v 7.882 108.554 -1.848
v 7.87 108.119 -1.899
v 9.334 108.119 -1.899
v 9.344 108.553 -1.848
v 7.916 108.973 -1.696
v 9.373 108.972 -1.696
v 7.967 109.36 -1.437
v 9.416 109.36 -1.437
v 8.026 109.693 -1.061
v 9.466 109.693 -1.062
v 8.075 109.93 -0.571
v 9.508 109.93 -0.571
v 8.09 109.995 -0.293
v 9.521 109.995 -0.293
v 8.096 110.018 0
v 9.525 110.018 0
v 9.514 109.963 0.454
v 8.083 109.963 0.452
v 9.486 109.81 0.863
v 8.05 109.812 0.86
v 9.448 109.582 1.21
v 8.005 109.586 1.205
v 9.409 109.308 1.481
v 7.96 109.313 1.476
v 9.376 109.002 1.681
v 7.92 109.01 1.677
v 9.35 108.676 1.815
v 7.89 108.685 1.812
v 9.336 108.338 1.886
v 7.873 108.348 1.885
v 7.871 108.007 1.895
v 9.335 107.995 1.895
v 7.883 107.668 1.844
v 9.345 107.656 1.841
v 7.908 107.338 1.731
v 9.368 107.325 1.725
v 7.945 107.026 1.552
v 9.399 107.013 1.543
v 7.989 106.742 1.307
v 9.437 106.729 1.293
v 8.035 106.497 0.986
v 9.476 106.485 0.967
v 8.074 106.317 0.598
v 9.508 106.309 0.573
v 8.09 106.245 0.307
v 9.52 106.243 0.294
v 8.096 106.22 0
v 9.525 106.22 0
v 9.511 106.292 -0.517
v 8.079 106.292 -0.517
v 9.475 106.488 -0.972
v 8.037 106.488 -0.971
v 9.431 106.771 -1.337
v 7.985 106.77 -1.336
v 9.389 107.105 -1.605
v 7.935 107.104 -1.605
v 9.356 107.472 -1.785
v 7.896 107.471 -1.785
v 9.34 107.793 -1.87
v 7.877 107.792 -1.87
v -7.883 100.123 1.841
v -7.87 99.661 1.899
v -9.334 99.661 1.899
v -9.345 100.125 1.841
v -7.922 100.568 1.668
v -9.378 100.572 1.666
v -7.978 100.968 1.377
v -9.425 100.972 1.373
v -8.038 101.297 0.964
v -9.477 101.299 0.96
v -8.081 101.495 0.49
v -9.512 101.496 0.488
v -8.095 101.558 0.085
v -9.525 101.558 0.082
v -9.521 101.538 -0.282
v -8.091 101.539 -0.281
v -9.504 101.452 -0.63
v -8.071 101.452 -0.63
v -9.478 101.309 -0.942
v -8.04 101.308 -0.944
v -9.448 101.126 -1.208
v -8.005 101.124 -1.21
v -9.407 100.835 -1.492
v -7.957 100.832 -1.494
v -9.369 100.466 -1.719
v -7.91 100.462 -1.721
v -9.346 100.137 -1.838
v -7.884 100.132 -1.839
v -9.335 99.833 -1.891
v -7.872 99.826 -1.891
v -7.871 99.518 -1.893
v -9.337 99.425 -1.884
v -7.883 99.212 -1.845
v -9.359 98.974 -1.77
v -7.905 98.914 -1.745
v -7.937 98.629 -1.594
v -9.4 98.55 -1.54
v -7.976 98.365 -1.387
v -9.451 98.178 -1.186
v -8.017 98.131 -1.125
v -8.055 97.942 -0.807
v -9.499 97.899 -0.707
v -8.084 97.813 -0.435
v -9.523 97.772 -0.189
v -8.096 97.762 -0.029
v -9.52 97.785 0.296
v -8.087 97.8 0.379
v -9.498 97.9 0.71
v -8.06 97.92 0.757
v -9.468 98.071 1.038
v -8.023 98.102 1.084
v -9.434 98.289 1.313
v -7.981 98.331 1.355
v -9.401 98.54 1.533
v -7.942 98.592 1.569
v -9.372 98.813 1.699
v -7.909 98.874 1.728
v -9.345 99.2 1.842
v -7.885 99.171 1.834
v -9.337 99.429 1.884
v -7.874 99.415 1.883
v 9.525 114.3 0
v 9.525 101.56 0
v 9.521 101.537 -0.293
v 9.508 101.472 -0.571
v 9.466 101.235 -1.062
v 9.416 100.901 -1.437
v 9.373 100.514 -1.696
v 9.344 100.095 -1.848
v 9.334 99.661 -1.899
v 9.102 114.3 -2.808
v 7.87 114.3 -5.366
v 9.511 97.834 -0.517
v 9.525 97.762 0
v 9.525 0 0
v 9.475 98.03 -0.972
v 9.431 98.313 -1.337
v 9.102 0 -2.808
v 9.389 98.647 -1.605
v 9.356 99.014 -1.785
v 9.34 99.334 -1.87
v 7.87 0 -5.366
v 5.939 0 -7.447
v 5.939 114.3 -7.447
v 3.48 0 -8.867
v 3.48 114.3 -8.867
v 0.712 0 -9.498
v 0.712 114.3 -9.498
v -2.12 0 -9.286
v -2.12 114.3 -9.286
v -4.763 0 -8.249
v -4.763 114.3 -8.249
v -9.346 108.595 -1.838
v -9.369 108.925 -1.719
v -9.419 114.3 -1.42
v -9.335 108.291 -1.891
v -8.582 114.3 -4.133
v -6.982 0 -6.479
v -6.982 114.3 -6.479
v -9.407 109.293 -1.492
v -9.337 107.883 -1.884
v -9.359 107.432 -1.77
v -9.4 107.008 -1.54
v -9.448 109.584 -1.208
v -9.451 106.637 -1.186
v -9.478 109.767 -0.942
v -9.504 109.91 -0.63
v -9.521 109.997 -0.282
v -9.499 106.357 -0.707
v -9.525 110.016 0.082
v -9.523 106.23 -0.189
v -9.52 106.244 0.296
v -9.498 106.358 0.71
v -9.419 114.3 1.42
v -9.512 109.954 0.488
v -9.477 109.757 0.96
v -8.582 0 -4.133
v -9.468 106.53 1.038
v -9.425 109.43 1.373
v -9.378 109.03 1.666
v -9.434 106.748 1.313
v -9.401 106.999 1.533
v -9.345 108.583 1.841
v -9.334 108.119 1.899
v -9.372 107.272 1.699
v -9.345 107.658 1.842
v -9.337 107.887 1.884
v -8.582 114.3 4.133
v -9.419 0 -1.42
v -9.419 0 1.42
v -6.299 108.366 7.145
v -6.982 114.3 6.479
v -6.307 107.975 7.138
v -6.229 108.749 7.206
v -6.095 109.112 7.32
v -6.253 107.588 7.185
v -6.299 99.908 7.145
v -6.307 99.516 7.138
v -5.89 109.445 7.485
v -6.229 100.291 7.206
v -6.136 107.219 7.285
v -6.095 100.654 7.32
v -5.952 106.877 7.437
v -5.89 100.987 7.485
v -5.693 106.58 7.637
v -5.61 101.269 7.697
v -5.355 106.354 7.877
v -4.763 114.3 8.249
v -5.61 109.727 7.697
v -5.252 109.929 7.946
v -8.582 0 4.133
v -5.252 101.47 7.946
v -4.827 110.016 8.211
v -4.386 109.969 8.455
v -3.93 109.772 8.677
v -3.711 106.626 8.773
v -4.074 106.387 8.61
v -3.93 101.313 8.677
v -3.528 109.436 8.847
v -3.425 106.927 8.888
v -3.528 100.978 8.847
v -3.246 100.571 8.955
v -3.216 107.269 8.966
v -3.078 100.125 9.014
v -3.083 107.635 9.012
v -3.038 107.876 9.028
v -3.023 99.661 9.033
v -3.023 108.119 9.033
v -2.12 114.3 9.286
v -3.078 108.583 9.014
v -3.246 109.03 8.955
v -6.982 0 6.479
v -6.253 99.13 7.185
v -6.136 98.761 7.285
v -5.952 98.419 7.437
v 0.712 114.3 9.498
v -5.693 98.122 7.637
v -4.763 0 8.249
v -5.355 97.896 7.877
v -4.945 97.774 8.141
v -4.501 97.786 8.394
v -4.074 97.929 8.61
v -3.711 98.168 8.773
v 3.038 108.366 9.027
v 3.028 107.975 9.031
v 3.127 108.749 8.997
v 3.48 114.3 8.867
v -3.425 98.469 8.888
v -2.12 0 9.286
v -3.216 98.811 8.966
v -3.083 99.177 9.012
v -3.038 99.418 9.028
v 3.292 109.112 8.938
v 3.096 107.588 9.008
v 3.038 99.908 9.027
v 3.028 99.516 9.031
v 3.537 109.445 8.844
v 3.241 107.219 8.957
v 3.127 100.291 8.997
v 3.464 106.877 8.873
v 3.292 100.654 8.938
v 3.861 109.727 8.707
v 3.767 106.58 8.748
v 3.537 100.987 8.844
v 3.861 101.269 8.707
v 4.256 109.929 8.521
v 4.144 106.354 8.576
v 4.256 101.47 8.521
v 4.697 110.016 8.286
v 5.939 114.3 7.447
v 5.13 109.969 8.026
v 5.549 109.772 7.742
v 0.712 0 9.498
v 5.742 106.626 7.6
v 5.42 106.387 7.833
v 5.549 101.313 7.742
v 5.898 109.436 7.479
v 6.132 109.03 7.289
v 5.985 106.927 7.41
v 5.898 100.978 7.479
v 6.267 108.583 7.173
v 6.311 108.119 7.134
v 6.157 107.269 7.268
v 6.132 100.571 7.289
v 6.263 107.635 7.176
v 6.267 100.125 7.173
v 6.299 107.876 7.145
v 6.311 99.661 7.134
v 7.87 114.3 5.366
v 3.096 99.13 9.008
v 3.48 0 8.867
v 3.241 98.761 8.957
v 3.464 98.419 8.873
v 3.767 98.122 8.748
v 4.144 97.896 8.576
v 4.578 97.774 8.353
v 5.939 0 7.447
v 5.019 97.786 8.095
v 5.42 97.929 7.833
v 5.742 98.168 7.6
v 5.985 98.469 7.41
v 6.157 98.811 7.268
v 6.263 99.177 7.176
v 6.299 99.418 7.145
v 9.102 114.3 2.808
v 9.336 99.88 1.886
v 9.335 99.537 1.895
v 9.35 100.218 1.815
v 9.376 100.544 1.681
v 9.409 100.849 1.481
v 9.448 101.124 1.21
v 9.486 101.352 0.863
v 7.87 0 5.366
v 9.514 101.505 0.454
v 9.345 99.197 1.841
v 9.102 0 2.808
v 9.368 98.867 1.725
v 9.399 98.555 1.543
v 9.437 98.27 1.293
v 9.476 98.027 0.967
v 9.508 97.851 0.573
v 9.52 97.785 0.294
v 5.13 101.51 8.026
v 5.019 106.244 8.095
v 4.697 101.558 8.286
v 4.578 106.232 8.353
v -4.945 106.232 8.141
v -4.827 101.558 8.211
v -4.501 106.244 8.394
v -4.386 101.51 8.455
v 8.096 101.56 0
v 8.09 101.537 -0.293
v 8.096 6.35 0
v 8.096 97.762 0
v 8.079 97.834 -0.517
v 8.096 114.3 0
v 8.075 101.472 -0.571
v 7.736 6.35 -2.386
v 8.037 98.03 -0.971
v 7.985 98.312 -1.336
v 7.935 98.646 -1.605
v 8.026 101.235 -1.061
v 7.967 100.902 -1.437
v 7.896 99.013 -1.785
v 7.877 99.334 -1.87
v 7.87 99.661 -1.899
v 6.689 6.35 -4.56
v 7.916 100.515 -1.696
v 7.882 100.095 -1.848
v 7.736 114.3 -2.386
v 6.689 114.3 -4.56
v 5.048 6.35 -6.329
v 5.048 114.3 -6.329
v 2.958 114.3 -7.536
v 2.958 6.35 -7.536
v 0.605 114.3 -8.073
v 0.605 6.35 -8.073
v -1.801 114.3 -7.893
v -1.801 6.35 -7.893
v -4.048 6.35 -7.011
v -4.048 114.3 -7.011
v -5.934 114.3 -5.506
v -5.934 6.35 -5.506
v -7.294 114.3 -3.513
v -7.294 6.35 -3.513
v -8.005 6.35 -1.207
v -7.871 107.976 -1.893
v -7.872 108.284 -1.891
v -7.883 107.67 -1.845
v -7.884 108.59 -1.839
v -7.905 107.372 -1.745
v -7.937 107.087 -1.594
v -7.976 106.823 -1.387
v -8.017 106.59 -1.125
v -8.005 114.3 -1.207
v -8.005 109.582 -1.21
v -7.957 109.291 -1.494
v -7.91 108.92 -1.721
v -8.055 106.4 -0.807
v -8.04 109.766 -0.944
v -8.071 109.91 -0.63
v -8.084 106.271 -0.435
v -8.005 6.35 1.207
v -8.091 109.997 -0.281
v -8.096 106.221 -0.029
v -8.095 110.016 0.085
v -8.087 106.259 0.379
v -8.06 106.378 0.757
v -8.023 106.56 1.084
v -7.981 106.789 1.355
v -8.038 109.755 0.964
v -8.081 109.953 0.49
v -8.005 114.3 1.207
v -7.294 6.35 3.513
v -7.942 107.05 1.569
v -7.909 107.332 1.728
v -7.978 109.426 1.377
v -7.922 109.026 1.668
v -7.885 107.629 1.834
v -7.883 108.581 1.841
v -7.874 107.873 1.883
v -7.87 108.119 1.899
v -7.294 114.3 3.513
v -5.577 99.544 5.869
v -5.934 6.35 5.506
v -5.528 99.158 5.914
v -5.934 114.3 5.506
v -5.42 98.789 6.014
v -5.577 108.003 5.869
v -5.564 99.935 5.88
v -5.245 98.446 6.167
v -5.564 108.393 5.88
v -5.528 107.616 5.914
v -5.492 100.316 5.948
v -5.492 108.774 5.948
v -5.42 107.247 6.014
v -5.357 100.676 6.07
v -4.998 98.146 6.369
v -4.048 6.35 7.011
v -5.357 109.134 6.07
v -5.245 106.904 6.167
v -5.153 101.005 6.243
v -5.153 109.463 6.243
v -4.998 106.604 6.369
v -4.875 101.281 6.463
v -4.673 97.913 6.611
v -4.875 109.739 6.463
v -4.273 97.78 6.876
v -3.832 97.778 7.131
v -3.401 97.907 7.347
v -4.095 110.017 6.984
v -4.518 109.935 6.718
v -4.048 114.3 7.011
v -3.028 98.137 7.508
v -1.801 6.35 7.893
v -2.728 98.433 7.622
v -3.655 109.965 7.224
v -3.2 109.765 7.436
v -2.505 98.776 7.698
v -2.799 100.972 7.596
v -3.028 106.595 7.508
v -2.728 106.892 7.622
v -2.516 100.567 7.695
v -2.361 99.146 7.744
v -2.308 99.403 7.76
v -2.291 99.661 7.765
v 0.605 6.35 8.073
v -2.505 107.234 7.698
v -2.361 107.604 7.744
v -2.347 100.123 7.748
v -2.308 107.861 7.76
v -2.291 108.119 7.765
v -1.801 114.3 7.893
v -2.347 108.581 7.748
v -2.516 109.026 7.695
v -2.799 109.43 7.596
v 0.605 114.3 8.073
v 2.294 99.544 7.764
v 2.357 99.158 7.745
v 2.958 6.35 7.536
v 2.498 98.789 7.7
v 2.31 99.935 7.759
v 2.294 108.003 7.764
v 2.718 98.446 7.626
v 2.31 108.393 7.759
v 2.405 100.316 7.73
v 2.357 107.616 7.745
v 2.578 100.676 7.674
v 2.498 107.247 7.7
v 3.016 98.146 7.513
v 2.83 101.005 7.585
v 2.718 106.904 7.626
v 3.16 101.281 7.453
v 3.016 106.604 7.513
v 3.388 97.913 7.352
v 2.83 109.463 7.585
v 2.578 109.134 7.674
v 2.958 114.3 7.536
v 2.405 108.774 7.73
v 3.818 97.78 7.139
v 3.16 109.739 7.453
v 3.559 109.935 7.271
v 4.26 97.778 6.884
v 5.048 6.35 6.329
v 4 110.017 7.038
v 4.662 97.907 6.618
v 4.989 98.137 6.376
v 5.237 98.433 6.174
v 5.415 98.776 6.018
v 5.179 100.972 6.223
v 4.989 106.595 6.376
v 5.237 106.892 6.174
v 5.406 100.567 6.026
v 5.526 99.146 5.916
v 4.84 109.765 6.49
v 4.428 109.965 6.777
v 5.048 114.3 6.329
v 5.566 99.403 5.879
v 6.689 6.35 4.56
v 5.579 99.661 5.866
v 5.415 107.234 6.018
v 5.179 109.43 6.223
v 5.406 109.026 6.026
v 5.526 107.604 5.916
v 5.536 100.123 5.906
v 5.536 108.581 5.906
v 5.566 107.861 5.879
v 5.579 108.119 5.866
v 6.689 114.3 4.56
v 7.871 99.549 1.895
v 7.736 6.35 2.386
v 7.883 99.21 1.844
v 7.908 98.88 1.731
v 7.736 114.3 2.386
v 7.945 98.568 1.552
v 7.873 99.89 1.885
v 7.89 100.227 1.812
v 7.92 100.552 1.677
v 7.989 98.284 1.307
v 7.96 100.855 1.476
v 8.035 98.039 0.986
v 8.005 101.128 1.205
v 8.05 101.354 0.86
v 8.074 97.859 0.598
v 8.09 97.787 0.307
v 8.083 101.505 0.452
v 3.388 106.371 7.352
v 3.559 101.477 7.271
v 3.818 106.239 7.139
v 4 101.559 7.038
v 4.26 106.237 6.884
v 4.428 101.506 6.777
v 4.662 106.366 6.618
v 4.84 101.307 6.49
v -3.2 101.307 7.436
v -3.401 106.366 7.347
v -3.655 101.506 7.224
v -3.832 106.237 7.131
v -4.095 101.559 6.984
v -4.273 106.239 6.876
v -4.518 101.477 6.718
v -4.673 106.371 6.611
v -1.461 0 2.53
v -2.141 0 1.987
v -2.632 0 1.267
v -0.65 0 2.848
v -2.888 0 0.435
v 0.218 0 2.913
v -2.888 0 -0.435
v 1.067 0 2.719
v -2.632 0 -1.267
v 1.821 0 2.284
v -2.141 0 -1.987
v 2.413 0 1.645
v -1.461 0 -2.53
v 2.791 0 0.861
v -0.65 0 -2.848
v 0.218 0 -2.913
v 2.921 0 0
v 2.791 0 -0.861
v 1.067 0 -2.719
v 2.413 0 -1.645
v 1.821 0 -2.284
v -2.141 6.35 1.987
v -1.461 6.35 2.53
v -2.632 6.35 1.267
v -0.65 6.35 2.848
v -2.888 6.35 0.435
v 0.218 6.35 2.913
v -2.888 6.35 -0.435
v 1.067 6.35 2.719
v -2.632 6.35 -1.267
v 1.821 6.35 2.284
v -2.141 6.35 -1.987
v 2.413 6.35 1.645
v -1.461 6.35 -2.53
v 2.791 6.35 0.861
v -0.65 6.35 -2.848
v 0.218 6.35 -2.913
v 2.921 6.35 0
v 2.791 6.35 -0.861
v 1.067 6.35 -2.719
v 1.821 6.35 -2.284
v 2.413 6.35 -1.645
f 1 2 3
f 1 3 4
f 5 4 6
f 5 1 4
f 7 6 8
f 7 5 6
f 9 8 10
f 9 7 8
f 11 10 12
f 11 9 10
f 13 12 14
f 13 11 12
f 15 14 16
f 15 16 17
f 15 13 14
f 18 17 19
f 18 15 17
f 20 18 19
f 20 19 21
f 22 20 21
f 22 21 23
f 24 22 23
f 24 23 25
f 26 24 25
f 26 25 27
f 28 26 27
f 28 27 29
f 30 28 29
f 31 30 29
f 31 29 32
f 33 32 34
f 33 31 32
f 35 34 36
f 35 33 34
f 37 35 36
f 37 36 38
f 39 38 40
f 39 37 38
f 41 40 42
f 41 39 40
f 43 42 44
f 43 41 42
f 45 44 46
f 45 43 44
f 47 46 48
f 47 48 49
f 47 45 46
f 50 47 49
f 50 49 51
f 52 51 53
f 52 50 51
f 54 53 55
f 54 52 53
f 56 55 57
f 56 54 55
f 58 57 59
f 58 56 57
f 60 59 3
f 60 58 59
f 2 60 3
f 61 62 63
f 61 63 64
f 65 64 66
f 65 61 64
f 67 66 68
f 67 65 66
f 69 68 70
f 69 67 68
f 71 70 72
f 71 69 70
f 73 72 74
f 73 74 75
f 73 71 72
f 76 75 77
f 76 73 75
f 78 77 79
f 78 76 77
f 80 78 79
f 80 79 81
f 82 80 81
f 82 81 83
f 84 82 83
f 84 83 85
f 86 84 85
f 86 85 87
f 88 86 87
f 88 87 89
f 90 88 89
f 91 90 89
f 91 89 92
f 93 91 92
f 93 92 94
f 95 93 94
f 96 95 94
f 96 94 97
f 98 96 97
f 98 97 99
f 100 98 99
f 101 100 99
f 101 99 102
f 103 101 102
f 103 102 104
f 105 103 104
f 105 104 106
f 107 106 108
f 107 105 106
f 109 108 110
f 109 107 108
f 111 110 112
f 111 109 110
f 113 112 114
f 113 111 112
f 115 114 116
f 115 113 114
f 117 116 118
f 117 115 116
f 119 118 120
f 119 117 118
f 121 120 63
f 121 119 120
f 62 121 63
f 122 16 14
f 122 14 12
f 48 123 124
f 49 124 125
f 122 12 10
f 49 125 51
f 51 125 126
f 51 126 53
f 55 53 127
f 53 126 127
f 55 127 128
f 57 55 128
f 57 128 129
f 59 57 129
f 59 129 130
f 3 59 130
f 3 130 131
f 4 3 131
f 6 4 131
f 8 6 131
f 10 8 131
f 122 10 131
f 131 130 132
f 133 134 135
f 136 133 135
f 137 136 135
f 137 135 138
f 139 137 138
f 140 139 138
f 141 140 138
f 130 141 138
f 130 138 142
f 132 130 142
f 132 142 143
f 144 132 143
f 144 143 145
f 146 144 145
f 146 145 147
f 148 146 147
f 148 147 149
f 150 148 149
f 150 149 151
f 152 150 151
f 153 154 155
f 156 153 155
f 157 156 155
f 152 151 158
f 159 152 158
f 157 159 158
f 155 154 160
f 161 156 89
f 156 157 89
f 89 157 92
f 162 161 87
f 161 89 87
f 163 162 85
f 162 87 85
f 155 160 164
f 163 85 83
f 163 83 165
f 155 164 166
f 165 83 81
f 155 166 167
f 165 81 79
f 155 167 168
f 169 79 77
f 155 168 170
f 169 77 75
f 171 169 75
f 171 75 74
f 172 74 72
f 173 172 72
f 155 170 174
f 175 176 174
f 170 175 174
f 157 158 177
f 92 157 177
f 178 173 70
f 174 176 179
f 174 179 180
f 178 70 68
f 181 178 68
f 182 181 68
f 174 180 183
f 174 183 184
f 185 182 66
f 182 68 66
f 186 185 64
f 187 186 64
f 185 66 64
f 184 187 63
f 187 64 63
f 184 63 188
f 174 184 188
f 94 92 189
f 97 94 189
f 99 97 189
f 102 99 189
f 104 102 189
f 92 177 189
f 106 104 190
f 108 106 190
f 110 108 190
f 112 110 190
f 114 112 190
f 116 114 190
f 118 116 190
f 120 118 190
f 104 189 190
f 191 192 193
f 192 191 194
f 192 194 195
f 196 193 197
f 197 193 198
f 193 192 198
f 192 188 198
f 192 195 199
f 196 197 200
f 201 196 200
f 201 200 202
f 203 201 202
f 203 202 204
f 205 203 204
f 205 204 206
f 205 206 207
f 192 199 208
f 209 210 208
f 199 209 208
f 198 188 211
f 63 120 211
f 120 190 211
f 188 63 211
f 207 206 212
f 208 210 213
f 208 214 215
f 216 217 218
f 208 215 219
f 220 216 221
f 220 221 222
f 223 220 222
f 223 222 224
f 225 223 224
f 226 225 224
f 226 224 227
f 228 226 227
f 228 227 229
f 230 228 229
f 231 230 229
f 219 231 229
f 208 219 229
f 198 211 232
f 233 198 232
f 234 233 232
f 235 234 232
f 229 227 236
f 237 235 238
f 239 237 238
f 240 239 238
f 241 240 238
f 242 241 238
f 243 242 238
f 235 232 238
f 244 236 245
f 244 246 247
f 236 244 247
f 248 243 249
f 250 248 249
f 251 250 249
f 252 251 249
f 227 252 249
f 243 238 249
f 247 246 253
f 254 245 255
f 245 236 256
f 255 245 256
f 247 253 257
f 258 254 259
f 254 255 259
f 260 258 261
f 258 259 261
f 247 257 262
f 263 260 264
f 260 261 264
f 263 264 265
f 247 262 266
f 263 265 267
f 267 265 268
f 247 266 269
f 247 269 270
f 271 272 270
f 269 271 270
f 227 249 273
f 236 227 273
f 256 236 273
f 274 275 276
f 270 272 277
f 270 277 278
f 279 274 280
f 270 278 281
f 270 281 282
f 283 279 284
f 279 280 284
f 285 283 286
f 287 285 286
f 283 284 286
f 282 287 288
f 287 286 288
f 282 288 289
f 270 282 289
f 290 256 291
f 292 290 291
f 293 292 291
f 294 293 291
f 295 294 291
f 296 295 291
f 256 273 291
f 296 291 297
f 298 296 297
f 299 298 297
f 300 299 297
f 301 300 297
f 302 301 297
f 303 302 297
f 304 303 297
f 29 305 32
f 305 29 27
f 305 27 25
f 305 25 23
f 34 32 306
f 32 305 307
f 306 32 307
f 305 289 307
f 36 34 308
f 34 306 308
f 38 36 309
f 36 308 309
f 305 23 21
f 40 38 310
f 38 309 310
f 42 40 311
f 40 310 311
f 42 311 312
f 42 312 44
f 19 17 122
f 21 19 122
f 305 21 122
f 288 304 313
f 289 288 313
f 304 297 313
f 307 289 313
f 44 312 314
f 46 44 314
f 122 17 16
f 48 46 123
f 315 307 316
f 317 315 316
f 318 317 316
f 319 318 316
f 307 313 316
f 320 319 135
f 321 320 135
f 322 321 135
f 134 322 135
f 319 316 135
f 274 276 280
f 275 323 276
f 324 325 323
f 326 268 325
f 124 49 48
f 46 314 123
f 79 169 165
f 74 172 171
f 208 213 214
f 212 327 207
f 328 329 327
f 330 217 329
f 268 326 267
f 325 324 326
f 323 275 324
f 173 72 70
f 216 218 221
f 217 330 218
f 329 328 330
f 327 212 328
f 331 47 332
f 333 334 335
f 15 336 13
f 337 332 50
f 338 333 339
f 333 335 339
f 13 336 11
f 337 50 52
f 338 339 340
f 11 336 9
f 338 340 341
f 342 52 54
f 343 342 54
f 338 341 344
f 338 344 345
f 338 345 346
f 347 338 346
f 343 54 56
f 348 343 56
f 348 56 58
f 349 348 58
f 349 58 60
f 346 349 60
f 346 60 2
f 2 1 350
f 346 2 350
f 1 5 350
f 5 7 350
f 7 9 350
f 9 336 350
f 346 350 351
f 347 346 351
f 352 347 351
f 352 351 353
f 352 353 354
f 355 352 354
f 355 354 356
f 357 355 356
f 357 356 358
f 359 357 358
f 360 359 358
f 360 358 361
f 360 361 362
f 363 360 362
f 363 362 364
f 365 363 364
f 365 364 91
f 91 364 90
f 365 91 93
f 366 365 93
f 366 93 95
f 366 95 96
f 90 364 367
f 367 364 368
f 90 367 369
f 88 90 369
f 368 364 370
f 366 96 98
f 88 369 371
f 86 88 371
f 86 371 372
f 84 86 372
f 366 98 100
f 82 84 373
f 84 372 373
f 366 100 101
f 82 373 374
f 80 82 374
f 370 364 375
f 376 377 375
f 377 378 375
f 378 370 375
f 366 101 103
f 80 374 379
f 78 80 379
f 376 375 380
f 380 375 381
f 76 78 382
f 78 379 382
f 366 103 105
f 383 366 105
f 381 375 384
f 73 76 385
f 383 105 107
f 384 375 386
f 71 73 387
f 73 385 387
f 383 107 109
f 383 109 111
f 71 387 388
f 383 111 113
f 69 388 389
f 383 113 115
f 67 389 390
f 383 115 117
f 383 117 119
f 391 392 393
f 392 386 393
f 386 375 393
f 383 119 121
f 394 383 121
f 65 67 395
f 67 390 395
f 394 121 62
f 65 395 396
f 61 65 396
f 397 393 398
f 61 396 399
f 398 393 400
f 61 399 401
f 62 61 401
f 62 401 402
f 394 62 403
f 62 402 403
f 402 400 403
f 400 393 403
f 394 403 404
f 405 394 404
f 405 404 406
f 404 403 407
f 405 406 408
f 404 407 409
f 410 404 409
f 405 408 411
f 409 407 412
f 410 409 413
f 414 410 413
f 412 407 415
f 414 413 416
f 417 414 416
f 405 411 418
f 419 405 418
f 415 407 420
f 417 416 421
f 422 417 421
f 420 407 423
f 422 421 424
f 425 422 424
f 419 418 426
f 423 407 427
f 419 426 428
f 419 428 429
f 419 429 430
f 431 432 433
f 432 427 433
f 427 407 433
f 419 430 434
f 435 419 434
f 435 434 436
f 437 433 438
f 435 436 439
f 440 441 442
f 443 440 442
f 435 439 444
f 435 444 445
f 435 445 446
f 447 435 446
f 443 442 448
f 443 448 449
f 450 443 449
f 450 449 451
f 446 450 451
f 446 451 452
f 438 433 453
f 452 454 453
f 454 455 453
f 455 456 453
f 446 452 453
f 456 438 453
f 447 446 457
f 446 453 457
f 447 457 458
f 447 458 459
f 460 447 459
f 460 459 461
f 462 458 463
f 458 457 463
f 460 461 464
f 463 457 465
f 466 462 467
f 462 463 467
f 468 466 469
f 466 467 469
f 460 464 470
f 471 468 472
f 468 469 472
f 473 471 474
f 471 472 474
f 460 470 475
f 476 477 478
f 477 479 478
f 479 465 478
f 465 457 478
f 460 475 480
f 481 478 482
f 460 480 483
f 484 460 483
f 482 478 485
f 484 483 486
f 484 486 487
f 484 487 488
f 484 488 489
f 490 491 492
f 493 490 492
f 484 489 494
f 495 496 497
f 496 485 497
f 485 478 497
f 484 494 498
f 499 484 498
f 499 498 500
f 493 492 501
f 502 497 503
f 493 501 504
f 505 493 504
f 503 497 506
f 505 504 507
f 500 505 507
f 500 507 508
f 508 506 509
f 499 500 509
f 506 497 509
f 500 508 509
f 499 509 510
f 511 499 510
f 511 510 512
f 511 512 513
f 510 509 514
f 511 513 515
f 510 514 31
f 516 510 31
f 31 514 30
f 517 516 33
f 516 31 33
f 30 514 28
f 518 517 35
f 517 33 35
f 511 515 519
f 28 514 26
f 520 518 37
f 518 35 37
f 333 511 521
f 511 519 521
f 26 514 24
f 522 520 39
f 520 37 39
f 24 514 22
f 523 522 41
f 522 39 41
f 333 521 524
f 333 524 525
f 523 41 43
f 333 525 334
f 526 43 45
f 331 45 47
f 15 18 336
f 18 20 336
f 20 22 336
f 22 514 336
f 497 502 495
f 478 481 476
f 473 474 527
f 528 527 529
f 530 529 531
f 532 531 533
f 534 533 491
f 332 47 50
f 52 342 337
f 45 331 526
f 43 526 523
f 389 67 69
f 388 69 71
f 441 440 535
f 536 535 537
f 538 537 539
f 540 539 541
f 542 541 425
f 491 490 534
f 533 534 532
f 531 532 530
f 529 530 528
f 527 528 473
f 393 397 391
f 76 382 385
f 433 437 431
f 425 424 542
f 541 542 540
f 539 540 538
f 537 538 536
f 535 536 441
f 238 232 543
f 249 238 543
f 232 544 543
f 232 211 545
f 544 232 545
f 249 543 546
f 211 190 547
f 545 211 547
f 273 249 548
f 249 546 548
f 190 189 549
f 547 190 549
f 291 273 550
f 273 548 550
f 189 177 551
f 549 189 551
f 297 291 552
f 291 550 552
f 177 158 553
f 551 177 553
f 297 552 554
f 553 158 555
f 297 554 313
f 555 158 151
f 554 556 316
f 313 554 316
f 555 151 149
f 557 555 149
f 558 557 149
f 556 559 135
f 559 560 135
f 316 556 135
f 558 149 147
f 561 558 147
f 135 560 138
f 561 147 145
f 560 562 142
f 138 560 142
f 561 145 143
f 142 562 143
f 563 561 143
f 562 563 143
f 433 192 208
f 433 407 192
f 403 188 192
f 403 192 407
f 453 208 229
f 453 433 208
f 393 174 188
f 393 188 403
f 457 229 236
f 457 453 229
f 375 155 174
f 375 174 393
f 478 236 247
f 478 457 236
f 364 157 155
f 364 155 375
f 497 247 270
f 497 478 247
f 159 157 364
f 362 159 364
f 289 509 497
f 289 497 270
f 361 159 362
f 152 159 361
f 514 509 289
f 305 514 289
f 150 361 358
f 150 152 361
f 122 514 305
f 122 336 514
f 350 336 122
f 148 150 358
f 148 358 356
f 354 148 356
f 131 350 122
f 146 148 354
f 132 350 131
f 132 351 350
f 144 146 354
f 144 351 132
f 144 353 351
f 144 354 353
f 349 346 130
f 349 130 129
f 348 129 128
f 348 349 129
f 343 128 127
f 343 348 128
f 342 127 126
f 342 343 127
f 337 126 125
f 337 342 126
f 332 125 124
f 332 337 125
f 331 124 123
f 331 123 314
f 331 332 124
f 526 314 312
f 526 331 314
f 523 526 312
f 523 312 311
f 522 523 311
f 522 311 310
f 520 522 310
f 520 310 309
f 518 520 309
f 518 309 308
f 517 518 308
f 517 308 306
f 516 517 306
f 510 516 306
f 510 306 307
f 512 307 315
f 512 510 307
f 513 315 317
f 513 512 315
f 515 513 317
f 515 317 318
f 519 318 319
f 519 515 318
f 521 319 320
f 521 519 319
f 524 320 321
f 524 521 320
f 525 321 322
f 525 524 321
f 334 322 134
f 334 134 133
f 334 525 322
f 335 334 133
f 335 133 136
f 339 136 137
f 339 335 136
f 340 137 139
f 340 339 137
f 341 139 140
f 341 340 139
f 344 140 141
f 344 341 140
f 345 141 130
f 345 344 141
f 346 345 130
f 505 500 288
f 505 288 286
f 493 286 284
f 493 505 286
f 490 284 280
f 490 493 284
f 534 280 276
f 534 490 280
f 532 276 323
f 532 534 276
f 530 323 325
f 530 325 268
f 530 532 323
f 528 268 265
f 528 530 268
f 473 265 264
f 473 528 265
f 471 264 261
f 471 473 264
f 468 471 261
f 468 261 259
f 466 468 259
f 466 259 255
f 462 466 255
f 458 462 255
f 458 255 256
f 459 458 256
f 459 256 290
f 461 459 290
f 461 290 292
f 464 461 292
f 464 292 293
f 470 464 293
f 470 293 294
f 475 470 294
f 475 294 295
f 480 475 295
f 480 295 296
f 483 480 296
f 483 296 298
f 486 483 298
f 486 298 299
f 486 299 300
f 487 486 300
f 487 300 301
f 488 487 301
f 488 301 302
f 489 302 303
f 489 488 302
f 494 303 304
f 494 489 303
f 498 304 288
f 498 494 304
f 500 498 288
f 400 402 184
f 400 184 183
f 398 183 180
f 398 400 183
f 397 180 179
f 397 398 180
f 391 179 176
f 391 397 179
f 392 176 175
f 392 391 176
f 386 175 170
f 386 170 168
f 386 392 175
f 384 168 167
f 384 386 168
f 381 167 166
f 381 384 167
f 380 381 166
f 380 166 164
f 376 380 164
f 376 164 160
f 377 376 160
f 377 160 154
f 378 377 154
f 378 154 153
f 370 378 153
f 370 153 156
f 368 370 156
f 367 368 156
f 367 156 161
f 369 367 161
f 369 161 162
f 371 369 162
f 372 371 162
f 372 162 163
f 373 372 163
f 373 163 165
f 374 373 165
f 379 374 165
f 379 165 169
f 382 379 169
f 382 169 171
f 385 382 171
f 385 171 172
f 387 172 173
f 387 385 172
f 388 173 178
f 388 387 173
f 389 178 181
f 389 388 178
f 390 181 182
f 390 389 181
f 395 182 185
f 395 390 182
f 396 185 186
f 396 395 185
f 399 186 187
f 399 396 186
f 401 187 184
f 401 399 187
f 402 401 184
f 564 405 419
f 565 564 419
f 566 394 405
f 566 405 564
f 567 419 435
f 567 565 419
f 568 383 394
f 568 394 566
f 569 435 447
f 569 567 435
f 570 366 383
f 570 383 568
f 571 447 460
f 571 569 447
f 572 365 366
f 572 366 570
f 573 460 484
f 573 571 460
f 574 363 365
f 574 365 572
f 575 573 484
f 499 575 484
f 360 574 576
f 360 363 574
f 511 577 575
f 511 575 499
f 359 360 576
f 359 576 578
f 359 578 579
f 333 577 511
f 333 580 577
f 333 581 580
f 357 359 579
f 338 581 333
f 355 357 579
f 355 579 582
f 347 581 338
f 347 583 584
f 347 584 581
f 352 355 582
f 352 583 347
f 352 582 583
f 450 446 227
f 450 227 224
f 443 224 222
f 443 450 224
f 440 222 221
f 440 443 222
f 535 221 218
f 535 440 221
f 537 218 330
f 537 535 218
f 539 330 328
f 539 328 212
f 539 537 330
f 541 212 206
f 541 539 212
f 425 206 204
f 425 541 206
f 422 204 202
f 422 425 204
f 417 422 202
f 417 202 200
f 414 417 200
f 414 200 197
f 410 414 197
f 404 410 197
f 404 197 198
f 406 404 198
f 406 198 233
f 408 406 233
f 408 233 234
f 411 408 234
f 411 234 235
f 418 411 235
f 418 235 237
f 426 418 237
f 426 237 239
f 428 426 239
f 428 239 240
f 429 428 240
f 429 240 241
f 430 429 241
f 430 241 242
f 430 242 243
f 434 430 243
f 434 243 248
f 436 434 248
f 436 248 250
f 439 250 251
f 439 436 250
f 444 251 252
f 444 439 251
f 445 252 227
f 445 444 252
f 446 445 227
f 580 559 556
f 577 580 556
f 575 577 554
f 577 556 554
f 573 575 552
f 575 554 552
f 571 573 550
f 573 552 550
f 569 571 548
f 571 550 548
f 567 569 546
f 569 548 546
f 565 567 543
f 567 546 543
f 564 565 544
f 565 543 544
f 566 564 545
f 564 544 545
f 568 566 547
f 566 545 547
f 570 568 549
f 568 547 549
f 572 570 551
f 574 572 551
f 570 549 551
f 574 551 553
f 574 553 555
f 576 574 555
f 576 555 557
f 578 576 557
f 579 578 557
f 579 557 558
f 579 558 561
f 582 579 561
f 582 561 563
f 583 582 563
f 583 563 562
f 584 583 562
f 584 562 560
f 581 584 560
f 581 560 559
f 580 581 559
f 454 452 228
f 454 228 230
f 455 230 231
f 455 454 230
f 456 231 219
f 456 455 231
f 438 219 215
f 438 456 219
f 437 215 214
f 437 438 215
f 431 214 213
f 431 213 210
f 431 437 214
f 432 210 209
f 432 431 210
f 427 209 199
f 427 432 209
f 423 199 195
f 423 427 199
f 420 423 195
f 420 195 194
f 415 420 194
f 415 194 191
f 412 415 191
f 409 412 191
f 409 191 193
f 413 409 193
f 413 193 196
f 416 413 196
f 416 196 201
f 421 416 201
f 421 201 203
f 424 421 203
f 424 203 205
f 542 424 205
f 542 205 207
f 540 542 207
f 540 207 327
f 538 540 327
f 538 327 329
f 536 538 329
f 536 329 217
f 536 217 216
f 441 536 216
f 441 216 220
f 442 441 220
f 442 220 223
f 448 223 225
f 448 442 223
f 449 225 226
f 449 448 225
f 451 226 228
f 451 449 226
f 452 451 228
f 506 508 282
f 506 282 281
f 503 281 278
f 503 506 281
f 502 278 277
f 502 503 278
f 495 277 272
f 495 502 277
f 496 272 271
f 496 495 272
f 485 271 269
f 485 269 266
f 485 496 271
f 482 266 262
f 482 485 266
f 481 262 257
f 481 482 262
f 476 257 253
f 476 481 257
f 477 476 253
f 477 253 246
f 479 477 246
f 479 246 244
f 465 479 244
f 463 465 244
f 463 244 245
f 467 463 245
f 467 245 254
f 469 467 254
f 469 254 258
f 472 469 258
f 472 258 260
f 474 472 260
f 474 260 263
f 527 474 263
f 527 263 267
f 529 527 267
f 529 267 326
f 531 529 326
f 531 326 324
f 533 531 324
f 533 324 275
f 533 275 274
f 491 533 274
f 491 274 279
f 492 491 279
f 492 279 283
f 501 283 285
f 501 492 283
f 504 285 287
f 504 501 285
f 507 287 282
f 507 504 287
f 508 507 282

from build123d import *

# Parameters (mm, degrees)
SKETCH1_R                 = 9.525
BOSS_EXTRUDE1_DEPTH       = 114.3
SKETCH2_R                 = 8.095601674
CUT_EXTRUDE1_DEPTH        = 1
CUT_EXTRUDE1_DEPTH_BACK   = 107.95
SKETCH4_R                 = 1.89865
CUT_EXTRUDE2_DEPTH        = 114.3
CIRPATTERN1_COUNT         = 4
CIRPATTERN1_ANGLE         = 180
LPATTERN1_COUNT           = 2
LPATTERN1_PITCH           = 8.4582
LPATTERN1_COPY_1_SKETCH_R = 1.89865
LPATTERN1_COPY_1_DEPTH    = 114.3
LPATTERN1_COPY_2_SKETCH_R = 1.89865
LPATTERN1_COPY_2_DEPTH    = 114.3
LPATTERN1_COPY_3_SKETCH_R = 1.89865
LPATTERN1_COPY_3_DEPTH    = 114.3
SKETCH5_R                 = 2.921
CUT_EXTRUDE3_DEPTH        = 114.3


with BuildPart() as part:
    # Sketch1 → Boss-Extrude1 (new body)
    with BuildSketch(Plane(origin=(0, 0, 0), x_dir=(1, 0, 0), z_dir=(0, 1, 0))):
        Circle(SKETCH1_R)
    extrude(amount=BOSS_EXTRUDE1_DEPTH)

    # Sketch2 → Cut-Extrude1 (cut, two sides)
    with BuildSketch(Plane(origin=(0, 114.3, 0), x_dir=(1, 0, 0), z_dir=(0, 1, 0))) as cut_extrude1_sk:
        Circle(SKETCH2_R)
    extrude(amount=CUT_EXTRUDE1_DEPTH, mode=Mode.SUBTRACT)
    extrude(cut_extrude1_sk.sketch, amount=-CUT_EXTRUDE1_DEPTH_BACK, mode=Mode.SUBTRACT)

    # Sketch4 → Cut-Extrude2 (cut)
    with BuildSketch(Plane(origin=(0, 0, 0), x_dir=(0, 0, -1), z_dir=(1, 0, 0))):
        with Locations((0, 108.119085448)):
            Circle(SKETCH4_R)
    cut_extrude2 = extrude(amount=CUT_EXTRUDE2_DEPTH, mode=Mode.SUBTRACT)

    # CirPattern1: Cut-Extrude2 ×4 about axis
    cirpattern1_axis = Axis((0, 114.3, 0), (0, -1, 0))
    for i in range(1, CIRPATTERN1_COUNT):
        add(cut_extrude2.rotate(cirpattern1_axis, i * CIRPATTERN1_ANGLE / (CIRPATTERN1_COUNT - 1)), mode=Mode.SUBTRACT)

    # LPattern1: Cut-Extrude2 ×2
    with Locations(*[(0, -i * LPATTERN1_PITCH, 0) for i in range(1, LPATTERN1_COUNT)]):
        add(cut_extrude2, mode=Mode.SUBTRACT)

    # LPattern1 copy 1 sketch → LPattern1 copy 1 (cut)
    with BuildSketch(Plane(origin=(0, -8.4582, 0), x_dir=(0.866025404, 0, -0.5), z_dir=(0.5, 0, 0.866025404))):
        with Locations((0, 108.119085448)):
            Circle(LPATTERN1_COPY_1_SKETCH_R)
    extrude(amount=LPATTERN1_COPY_1_DEPTH, mode=Mode.SUBTRACT)

    # LPattern1 copy 2 sketch → LPattern1 copy 2 (cut)
    with BuildSketch(Plane(origin=(0, -8.4582, 0), x_dir=(0.866025404, 0, 0.5), z_dir=(-0.5, 0, 0.866025404))):
        with Locations((0, 108.119085448)):
            Circle(LPATTERN1_COPY_2_SKETCH_R)
    extrude(amount=LPATTERN1_COPY_2_DEPTH, mode=Mode.SUBTRACT)

    # LPattern1 copy 3 sketch → LPattern1 copy 3 (cut)
    with BuildSketch(Plane(origin=(0, -8.4582, 0), x_dir=(0, 0, 1), z_dir=(-1, 0, 0))):
        with Locations((0, 108.119085448)):
            Circle(LPATTERN1_COPY_3_SKETCH_R)
    extrude(amount=LPATTERN1_COPY_3_DEPTH, mode=Mode.SUBTRACT)

    # Sketch5 → Cut-Extrude3 (cut)
    with BuildSketch(Plane.XZ):
        Circle(SKETCH5_R)
    extrude(amount=-CUT_EXTRUDE3_DEPTH, mode=Mode.SUBTRACT)


solid = part.part
